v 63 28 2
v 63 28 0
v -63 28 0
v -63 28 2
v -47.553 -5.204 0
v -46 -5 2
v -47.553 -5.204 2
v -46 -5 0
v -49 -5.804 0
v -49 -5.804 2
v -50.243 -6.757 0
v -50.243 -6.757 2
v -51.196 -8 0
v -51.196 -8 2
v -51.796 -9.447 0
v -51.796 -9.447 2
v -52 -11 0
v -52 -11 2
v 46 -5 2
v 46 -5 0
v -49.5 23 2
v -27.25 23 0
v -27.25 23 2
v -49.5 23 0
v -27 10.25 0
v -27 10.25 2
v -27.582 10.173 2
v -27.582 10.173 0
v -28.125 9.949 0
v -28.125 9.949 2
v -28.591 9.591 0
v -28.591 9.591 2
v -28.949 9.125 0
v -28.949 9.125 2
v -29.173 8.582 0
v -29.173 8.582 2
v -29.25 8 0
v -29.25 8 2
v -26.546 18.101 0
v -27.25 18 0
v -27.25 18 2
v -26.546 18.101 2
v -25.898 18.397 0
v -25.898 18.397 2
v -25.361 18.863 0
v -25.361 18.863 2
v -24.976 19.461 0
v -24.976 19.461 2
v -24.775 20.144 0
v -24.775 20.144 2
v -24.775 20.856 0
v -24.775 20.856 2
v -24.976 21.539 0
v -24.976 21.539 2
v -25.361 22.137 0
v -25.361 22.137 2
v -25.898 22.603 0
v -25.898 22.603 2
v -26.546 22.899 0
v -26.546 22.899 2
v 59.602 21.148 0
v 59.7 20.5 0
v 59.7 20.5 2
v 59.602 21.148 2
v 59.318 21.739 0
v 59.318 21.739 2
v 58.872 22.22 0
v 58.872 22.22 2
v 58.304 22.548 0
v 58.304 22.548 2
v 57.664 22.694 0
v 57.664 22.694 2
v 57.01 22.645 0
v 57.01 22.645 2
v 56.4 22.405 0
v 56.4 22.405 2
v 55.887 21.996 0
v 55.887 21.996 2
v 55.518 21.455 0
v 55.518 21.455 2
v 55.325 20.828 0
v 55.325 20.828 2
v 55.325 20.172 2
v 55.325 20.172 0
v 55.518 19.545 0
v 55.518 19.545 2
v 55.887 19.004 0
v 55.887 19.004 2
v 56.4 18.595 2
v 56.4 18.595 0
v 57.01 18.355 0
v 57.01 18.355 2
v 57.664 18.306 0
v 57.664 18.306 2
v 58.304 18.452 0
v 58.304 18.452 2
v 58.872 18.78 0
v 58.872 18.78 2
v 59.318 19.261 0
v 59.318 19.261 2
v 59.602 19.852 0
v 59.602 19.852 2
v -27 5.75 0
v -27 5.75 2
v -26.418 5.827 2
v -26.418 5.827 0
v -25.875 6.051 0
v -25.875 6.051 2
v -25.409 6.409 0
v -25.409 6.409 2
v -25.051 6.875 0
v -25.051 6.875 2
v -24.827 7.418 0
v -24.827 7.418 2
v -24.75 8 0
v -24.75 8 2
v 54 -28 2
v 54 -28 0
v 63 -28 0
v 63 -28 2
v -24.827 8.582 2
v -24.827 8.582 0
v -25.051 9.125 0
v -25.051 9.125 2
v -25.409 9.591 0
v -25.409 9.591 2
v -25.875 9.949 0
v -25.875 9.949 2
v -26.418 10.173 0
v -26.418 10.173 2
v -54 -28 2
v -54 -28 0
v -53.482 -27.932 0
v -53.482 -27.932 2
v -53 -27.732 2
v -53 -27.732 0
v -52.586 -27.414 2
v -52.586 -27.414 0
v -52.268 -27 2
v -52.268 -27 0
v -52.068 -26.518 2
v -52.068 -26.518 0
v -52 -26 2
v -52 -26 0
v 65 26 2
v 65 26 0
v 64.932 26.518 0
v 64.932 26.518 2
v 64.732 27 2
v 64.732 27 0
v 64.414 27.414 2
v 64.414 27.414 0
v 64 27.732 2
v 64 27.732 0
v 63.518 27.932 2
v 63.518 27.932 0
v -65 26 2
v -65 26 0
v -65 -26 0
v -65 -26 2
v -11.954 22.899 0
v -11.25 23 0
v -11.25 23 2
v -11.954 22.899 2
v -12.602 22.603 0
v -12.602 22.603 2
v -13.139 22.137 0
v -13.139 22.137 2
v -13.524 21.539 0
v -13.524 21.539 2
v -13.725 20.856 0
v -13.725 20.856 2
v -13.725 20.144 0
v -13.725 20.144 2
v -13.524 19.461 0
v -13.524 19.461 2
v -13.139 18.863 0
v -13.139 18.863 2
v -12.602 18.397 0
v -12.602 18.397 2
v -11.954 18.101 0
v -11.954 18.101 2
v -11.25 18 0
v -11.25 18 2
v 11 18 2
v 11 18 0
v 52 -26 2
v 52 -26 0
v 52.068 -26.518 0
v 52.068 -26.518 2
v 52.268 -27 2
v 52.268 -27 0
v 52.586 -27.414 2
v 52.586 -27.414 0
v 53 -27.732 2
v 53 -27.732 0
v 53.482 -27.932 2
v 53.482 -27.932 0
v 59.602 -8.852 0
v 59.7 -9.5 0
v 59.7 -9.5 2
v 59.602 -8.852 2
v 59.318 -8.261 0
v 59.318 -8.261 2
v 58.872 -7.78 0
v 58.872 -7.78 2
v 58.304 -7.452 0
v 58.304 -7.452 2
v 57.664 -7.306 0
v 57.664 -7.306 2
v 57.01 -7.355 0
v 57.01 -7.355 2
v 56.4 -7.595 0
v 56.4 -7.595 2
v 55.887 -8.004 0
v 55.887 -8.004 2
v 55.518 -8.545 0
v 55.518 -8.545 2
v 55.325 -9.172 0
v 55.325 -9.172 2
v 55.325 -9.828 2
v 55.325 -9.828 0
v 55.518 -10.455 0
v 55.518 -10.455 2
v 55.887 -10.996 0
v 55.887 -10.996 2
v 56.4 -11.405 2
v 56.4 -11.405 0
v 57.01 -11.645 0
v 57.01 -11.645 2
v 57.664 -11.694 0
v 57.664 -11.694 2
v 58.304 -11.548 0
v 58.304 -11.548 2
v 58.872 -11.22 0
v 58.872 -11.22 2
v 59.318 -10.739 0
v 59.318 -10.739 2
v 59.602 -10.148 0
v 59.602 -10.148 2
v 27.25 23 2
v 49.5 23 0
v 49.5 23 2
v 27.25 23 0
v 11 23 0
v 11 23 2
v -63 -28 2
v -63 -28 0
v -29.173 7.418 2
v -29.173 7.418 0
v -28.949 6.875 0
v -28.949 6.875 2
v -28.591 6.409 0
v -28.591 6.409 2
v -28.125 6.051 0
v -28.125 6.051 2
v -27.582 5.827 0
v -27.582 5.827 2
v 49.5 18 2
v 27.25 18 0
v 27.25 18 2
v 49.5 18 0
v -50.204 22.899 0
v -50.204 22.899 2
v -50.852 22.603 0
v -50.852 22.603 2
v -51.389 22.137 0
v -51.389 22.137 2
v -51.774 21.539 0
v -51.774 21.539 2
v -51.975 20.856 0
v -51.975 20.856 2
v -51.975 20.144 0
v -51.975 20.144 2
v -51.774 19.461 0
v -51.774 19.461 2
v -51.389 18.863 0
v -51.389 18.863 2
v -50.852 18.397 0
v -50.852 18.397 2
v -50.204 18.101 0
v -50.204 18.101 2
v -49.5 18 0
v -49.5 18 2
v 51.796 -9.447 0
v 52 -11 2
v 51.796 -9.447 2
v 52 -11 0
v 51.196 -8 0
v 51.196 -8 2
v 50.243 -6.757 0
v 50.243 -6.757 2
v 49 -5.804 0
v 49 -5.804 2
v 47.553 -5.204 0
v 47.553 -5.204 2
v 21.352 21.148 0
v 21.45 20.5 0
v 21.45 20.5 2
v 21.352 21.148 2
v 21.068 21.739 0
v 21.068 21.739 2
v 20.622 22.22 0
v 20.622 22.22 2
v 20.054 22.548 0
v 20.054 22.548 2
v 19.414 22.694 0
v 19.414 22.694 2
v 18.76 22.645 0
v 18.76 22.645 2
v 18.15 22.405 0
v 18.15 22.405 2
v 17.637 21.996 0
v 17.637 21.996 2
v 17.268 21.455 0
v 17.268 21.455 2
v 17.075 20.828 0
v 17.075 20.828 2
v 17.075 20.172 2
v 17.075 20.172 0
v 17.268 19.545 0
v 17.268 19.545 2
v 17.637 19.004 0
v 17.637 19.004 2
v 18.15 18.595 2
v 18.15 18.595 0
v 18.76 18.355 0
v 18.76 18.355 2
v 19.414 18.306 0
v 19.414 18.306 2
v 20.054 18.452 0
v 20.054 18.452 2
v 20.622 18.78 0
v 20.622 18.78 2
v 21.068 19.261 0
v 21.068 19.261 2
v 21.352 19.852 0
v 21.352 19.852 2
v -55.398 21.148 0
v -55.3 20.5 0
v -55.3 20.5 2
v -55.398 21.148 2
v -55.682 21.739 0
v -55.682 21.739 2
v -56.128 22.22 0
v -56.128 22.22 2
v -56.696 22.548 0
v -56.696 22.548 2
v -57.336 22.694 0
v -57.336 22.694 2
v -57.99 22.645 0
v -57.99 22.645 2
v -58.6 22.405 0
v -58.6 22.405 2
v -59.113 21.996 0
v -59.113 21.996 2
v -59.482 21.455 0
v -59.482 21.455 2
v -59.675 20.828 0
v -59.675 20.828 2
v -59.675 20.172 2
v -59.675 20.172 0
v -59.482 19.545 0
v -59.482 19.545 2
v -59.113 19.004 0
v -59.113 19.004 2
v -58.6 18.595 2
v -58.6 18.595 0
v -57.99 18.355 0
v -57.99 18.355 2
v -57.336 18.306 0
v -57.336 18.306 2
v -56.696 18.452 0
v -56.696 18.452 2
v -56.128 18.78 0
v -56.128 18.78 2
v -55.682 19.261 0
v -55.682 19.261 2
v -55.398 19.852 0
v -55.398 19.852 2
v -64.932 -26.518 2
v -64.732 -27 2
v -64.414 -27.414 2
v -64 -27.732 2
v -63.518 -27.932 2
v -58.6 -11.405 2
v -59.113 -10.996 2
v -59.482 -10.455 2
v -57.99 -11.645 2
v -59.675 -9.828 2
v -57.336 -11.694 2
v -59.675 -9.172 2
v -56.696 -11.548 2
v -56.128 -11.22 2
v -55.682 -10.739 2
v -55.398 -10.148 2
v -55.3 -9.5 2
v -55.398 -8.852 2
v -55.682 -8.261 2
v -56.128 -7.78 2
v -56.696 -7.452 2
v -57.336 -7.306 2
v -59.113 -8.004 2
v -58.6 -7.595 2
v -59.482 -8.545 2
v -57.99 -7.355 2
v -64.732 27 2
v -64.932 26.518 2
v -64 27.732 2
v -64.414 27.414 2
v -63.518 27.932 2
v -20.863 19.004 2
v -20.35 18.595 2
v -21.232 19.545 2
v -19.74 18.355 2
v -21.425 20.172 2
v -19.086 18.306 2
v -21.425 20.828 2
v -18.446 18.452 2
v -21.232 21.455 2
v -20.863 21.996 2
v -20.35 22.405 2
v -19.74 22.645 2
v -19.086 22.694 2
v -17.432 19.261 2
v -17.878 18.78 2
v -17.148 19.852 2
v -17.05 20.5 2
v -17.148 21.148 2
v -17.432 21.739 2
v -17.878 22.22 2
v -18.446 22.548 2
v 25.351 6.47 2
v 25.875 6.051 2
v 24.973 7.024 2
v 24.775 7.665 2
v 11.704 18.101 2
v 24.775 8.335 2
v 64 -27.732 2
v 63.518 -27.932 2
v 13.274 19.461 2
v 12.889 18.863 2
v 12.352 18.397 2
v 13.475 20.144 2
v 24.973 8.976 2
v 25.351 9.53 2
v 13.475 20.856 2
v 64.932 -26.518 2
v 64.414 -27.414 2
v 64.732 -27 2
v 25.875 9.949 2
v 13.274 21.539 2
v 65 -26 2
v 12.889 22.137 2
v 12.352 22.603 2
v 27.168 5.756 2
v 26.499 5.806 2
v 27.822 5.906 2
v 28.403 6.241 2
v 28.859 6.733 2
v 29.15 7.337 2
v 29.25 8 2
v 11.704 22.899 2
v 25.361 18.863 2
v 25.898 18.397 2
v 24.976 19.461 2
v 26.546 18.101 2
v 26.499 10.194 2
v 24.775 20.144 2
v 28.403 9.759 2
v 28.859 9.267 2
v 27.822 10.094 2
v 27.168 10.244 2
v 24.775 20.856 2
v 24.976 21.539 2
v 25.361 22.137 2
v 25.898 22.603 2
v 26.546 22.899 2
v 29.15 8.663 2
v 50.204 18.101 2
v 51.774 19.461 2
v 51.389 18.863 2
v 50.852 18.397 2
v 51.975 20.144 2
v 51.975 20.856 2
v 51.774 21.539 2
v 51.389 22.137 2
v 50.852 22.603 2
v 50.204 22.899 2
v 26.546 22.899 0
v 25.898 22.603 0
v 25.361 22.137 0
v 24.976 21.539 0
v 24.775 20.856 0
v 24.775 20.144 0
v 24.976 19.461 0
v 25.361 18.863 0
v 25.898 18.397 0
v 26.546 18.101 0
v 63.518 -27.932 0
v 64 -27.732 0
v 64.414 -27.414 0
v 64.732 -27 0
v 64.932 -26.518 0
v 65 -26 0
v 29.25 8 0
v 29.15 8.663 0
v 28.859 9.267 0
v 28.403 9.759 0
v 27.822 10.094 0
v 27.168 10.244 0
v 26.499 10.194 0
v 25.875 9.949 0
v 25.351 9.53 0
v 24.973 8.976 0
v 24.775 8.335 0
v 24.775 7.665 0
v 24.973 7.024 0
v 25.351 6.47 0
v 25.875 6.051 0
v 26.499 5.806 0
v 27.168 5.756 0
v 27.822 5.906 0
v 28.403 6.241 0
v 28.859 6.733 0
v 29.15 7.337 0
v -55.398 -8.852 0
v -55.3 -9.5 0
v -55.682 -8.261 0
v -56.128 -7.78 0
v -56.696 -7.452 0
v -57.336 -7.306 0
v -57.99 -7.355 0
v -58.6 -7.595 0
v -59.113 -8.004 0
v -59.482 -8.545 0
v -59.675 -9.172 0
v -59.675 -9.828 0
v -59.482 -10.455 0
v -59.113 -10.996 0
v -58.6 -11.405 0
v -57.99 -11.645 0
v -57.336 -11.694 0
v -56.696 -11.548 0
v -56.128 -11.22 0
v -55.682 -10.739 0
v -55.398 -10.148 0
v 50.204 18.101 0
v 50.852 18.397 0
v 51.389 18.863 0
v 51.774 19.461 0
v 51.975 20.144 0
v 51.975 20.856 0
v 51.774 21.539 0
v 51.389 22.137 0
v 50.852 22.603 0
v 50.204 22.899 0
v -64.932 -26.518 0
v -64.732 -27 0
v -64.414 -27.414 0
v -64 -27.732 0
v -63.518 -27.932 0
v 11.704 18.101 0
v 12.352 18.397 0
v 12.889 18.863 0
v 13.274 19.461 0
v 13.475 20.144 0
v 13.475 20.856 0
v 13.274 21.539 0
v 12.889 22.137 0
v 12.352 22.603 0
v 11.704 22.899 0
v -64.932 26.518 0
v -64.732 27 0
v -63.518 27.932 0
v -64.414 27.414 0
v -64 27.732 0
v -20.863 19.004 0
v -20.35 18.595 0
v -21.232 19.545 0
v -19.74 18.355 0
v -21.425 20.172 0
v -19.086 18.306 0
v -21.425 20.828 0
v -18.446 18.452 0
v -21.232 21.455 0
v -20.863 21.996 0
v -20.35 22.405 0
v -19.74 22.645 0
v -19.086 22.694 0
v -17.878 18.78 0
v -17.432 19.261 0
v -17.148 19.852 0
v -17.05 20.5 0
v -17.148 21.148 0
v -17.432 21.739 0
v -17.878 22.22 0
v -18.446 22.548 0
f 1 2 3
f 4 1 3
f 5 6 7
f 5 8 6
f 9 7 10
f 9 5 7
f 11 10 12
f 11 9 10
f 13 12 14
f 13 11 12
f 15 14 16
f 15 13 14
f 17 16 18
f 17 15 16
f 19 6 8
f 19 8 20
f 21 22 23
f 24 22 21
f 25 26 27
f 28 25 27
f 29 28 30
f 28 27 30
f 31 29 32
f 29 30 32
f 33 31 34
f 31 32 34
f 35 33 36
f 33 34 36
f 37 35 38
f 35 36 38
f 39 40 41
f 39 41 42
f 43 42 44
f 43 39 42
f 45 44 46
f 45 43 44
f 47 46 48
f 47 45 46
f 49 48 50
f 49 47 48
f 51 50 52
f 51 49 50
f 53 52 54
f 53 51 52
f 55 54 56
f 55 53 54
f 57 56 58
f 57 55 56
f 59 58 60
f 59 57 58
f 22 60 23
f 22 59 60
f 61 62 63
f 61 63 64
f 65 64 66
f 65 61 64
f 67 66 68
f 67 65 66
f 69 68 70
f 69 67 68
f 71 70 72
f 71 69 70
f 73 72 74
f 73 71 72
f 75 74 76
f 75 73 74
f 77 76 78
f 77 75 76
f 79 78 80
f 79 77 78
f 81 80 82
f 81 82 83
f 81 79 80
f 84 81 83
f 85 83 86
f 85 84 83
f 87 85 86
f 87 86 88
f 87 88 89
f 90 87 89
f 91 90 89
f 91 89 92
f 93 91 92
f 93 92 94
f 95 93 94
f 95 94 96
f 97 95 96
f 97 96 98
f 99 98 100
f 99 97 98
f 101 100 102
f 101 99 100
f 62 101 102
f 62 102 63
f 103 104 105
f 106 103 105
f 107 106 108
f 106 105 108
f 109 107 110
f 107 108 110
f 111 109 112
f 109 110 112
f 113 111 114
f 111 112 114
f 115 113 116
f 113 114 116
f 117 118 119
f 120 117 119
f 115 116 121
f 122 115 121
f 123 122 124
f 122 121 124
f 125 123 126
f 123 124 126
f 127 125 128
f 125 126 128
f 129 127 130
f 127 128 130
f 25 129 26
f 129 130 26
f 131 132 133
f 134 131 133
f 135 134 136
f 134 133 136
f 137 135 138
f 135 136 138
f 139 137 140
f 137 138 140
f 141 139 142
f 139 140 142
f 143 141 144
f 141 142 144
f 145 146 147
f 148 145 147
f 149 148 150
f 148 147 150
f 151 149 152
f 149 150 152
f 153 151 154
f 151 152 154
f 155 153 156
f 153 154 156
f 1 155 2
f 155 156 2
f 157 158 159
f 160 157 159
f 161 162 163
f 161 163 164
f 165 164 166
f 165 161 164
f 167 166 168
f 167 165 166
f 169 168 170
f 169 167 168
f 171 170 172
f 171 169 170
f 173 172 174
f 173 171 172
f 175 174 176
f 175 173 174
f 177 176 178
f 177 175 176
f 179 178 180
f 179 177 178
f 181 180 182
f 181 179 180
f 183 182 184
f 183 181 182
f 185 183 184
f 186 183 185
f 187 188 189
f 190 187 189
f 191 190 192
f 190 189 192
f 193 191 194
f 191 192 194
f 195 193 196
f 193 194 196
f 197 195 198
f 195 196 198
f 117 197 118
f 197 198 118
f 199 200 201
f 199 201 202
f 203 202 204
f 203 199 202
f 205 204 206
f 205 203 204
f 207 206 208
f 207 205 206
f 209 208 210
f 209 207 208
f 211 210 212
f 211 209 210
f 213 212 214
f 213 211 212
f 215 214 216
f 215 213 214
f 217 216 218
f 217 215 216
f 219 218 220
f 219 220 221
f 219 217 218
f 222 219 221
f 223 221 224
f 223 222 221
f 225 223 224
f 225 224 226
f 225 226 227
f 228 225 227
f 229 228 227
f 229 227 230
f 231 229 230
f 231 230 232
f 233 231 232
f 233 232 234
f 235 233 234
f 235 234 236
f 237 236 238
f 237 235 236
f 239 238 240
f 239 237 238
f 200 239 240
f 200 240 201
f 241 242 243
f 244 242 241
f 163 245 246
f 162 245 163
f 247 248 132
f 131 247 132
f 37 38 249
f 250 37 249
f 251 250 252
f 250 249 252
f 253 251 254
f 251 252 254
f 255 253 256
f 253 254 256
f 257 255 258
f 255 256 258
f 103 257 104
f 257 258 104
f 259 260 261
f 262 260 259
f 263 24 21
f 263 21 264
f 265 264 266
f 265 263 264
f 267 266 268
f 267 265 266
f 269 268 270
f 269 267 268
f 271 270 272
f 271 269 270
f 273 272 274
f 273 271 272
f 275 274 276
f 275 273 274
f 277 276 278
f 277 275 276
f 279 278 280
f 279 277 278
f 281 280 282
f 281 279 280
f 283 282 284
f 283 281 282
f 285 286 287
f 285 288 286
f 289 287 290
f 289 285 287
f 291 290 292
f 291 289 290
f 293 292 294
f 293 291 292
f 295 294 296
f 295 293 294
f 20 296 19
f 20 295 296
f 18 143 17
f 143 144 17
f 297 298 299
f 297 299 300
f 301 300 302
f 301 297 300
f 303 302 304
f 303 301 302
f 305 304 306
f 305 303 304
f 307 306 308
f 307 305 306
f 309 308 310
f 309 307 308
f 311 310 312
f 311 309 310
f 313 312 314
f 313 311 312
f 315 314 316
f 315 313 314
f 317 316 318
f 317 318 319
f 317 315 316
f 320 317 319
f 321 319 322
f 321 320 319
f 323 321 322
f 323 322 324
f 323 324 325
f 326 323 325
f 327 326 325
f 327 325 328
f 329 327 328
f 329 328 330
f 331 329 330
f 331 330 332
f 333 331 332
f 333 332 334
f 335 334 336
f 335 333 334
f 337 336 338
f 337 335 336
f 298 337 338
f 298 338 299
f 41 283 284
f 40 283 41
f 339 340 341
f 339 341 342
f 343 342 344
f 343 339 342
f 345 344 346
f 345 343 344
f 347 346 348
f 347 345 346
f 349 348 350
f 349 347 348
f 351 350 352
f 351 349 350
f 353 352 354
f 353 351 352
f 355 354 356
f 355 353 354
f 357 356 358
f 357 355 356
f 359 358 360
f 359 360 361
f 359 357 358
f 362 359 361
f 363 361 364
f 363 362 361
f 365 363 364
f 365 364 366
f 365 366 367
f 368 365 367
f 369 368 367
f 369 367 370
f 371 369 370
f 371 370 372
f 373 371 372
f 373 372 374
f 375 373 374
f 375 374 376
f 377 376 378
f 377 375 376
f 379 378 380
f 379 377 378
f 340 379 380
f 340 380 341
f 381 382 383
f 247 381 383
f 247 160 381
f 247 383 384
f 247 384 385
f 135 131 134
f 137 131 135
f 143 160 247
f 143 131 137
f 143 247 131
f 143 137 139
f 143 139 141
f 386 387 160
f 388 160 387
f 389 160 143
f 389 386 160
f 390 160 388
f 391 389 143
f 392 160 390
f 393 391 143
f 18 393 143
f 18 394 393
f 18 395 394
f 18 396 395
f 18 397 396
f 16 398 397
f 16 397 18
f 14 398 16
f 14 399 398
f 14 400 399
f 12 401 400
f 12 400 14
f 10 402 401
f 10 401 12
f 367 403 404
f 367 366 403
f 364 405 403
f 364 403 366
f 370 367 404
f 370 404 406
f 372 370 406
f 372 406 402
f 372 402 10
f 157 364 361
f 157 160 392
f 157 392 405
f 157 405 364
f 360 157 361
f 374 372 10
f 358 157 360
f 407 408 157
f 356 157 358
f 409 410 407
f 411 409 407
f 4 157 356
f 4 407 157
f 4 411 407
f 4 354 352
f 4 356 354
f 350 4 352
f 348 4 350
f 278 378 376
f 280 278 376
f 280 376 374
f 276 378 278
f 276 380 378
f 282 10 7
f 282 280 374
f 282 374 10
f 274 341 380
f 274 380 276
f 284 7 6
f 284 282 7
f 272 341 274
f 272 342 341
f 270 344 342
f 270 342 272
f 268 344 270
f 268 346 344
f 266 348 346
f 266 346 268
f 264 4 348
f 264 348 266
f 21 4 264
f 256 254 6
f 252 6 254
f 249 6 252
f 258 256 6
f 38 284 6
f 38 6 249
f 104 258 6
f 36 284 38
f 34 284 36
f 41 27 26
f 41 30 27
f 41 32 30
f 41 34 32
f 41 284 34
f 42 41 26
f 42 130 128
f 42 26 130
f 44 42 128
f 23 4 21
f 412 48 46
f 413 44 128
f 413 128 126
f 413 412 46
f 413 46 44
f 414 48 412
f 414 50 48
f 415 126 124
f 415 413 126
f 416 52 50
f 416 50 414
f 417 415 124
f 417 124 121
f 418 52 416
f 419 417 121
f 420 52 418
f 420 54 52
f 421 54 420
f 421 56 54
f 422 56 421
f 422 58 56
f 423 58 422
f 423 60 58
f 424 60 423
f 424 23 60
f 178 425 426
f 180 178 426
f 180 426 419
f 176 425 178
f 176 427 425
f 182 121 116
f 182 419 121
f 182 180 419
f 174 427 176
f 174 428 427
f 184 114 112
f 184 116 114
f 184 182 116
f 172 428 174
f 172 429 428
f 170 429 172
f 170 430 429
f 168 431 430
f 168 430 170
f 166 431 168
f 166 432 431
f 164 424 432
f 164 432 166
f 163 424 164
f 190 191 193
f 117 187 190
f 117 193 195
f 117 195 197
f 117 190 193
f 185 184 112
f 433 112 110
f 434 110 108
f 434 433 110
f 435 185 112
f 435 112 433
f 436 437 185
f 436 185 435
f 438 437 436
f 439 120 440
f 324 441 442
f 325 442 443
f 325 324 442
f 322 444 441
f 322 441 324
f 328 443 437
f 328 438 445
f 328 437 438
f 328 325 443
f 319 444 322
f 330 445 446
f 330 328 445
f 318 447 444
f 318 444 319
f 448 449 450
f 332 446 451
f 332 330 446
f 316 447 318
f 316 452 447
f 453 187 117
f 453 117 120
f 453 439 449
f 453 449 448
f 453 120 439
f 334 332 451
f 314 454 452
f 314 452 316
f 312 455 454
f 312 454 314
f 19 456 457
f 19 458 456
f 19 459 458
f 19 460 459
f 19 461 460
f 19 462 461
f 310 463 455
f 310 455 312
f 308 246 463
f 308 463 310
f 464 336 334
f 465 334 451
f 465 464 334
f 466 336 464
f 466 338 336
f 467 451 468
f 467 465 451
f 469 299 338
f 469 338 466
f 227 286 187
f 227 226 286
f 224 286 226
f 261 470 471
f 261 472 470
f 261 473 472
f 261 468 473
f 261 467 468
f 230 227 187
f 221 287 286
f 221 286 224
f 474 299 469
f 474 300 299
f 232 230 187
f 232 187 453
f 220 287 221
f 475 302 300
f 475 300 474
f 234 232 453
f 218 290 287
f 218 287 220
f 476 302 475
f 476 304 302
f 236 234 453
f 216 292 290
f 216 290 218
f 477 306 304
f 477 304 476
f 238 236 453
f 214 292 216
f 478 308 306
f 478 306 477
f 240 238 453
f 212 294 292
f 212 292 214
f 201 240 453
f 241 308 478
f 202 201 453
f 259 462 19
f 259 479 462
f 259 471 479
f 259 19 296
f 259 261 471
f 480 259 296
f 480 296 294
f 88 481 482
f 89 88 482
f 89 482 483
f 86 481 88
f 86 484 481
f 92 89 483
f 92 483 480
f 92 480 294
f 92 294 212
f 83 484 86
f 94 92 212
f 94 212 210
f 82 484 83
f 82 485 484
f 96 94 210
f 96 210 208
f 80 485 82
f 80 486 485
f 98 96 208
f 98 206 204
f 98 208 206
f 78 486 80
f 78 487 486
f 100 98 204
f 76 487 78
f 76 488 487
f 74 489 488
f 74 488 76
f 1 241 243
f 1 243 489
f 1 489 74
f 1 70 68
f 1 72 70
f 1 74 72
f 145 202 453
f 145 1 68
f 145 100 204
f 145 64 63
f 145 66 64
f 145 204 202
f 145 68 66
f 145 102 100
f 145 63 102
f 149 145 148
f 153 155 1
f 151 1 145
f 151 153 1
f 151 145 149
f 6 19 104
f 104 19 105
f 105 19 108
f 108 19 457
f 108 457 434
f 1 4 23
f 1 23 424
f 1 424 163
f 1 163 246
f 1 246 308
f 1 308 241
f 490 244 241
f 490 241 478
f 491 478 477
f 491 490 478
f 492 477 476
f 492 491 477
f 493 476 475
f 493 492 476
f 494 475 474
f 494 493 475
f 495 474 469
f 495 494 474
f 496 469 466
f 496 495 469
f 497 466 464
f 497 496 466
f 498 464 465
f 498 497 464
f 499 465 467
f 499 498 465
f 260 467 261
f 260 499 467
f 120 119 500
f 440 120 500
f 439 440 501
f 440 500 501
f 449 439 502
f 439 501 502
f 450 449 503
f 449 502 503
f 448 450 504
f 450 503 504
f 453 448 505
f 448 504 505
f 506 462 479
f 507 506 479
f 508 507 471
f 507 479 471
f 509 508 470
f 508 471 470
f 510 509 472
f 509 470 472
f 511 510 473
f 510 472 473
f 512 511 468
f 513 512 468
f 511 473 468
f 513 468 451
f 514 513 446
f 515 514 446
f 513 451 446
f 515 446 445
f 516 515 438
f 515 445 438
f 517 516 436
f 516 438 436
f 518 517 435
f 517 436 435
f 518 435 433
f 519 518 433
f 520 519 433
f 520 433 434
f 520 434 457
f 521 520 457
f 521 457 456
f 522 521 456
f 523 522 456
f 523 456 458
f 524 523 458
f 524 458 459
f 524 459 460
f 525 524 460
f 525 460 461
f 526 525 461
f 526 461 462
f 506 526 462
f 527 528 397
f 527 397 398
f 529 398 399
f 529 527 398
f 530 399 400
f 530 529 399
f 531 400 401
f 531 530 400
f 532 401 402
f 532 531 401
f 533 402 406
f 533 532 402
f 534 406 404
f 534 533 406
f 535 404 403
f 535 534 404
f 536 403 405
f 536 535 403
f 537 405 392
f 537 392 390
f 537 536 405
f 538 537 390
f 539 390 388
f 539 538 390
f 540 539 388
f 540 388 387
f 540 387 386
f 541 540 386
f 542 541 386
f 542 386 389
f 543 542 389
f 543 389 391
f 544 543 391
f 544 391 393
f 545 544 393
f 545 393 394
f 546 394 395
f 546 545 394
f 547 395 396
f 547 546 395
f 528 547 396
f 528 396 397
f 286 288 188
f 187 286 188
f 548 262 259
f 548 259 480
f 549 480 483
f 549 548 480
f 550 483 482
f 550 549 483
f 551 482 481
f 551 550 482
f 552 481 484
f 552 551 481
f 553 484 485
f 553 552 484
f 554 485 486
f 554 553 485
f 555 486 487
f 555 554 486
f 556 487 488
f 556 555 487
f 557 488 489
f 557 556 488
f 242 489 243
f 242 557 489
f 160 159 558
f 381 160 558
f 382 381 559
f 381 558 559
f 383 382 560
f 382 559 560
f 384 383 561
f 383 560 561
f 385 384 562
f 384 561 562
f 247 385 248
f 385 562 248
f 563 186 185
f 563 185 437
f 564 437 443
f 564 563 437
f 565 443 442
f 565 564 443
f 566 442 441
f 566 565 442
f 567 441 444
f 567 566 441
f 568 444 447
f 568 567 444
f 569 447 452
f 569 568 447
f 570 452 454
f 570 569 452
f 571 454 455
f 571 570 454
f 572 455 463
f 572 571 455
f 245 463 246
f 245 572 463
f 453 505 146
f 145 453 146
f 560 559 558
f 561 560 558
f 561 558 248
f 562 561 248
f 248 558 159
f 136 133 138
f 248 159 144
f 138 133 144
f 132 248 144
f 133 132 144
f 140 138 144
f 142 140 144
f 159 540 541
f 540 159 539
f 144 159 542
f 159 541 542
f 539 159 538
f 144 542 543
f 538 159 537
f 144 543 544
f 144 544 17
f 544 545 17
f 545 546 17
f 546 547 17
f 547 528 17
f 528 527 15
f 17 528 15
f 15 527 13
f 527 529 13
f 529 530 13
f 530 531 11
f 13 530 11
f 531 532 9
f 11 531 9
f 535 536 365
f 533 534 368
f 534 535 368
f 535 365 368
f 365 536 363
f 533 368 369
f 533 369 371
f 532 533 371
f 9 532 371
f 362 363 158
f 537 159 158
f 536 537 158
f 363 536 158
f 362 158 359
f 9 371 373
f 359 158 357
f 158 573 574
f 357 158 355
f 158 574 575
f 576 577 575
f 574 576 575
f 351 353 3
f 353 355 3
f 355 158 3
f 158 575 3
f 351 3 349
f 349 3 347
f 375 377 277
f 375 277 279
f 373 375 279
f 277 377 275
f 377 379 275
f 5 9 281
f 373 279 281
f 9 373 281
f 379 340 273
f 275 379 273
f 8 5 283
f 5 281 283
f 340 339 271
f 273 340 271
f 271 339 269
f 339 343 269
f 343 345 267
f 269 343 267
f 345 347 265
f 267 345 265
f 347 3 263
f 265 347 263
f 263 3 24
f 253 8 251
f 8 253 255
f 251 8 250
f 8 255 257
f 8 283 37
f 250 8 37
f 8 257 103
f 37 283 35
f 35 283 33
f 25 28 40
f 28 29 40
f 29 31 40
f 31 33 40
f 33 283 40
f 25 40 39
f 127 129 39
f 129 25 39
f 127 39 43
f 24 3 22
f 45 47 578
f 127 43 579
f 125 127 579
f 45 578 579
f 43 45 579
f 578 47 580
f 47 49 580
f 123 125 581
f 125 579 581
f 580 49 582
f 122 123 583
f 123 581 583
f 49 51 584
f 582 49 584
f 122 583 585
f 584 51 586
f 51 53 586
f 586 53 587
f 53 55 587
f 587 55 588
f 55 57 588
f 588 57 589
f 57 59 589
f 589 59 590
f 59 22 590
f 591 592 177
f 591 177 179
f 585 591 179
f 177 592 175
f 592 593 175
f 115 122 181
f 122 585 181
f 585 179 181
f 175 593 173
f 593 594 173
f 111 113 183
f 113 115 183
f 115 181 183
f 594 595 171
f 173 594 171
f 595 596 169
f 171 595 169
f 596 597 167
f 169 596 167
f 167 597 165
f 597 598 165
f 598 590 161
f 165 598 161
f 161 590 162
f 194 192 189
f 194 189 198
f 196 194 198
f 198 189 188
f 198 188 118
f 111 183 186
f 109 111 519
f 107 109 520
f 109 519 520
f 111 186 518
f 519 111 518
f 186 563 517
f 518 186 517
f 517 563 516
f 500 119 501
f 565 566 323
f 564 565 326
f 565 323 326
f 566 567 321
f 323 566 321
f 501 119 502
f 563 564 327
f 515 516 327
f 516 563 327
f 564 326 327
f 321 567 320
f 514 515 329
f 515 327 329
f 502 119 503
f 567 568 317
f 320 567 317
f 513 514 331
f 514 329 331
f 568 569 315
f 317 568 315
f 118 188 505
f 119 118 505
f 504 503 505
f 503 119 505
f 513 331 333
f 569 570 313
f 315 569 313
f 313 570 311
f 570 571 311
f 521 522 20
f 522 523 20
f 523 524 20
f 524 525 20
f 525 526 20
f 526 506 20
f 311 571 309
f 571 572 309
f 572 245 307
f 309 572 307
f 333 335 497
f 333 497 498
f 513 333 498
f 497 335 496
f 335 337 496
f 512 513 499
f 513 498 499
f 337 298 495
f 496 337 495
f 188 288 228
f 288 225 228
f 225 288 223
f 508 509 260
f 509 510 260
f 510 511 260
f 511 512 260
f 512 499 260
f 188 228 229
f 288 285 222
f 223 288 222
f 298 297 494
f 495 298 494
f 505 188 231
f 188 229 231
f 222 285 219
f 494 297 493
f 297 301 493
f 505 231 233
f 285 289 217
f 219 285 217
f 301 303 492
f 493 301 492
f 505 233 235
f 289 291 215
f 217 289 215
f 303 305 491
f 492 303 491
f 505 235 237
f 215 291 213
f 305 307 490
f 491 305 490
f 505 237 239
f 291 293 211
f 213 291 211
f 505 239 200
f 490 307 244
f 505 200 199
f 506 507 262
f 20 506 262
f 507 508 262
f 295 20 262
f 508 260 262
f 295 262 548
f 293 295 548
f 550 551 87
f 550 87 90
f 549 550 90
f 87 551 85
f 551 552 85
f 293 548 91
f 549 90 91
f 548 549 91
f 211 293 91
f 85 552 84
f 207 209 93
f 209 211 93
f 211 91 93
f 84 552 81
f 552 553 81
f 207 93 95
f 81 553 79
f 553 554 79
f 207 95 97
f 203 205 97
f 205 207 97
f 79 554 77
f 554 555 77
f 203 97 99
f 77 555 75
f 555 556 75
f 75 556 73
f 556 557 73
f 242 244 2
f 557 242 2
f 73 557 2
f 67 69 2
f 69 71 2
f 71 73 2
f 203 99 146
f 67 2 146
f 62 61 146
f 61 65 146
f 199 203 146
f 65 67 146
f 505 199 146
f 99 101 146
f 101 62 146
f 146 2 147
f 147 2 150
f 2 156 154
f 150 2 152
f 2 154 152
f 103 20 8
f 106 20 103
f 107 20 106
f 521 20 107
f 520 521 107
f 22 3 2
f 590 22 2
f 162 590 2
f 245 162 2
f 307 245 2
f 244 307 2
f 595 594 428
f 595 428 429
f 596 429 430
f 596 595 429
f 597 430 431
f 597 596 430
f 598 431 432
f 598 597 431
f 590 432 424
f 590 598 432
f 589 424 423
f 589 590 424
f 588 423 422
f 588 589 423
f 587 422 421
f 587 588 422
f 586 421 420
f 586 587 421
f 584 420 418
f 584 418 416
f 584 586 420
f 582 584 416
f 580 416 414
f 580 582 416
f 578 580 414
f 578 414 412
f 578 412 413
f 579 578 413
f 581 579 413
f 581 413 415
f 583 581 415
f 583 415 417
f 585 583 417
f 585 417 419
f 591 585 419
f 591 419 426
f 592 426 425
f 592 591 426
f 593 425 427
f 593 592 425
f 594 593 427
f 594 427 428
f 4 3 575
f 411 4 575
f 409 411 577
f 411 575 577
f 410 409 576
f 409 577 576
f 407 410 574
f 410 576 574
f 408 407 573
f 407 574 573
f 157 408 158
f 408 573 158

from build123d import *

# Parameters (mm, degrees)
SKETCH_1_R          = 2.2
SKETCH_1_R_2        = 2.25
EXTRUDE_1_DEPTH     = 2
EXTRUDE_START       = -2
EXTRUDE_2_DEPTH     = 2
SKETCH_3_R          = 2.25
CUT_EXTRUDE_1_DEPTH = 23
SKETCH_3_3_R        = 2.25
EXTRUDE_3_DEPTH     = 2
SKETCH_5_W          = 104
SKETCH_5_H          = 6
CUT_EXTRUDE_2_DEPTH = 24
FILLET_1_R          = 6


with BuildPart() as part:
    # 草图1 → 凸台-拉伸1 (new body)
    with BuildSketch(Plane.XY):
        with BuildLine():
            Line((63, 28), (-63, 28))
            ThreePointArc((-63, 28), (-64.414213562, 27.414213562), (-65, 26))
            Line((-65, 26), (-65, -26))
            ThreePointArc((-65, -26), (-64.414213562, -27.414213562), (-63, -28))
            Line((-63, -28), (-54, -28))
            ThreePointArc((-54, -28), (-52.585786438, -27.414213562), (-52, -26))
            Line((-52, -26), (-52, -8))
            ThreePointArc((-52, -8), (-51.414213562, -6.585786438), (-50, -6))
            Line((-50, -6), (50, -6))
            ThreePointArc((50, -6), (51.414213562, -6.585786438), (52, -8))
            Line((52, -8), (52, -26))
            ThreePointArc((52, -26), (52.585786438, -27.414213562), (54, -28))
            Line((54, -28), (63, -28))
            ThreePointArc((63, -28), (64.414213562, -27.414213562), (65, -26))
            Line((65, -26), (65, 26))
            ThreePointArc((65, 26), (64.414213562, 27.414213562), (63, 28))
        make_face()
        with Locations((-57.5, -9.5)):
            Circle(SKETCH_1_R, mode=Mode.SUBTRACT)
        with Locations((-57.5, 20.5)):
            Circle(SKETCH_1_R, mode=Mode.SUBTRACT)
        with Locations((19.25, 20.5)):
            Circle(SKETCH_1_R, mode=Mode.SUBTRACT)
        with Locations((-19.25, 20.5)):
            Circle(SKETCH_1_R, mode=Mode.SUBTRACT)
        with Locations((57.5, 20.5)):
            Circle(SKETCH_1_R, mode=Mode.SUBTRACT)
        with Locations((57.5, -9.5)):
            Circle(SKETCH_1_R, mode=Mode.SUBTRACT)
        with Locations((27, 2.5)):
            Circle(SKETCH_1_R_2, mode=Mode.SUBTRACT)
        with Locations((-27, 2.5)):
            Circle(SKETCH_1_R_2, mode=Mode.SUBTRACT)
        with BuildLine():
            Line((27.25, 18), (49.5, 18))
            ThreePointArc((49.5, 18), (52, 20.5), (49.5, 23))
            Line((49.5, 23), (27.25, 23))
            ThreePointArc((27.25, 23), (24.75, 20.5), (27.25, 18))
        make_face(mode=Mode.SUBTRACT)
        with BuildLine():
            Line((-11.25, 18), (11, 18))
            ThreePointArc((11, 18), (13.5, 20.5), (11, 23))
            Line((11, 23), (-11.25, 23))
            ThreePointArc((-11.25, 23), (-13.75, 20.5), (-11.25, 18))
        make_face(mode=Mode.SUBTRACT)
        with BuildLine():
            Line((-49.5, 18), (-27.25, 18))
            ThreePointArc((-27.25, 18), (-24.75, 20.5), (-27.25, 23))
            Line((-27.25, 23), (-49.5, 23))
            ThreePointArc((-49.5, 23), (-52, 20.5), (-49.5, 18))
        make_face(mode=Mode.SUBTRACT)
    extrude(amount=EXTRUDE_1_DEPTH)

    # 草图2 → 凸台-拉伸2 (add)
    with BuildSketch(Plane.XY.offset(2).offset(EXTRUDE_START)):
        with BuildLine():
            Line((-52, -8), (-52, -11))
            Line((-52, -11), (52, -11))
            Line((52, -11), (52, -8))
            ThreePointArc((52, -8), (51.414213562, -6.585786438), (50, -6))
            Line((50, -6), (-50, -6))
            ThreePointArc((-50, -6), (-51.414213562, -6.585786438), (-52, -8))
        make_face()
    extrude(amount=EXTRUDE_2_DEPTH)

    # 草图3 → 切除-拉伸1 (cut)
    with BuildSketch(Plane.XY.offset(2)):
        with Locations((-27, 8)):
            Circle(SKETCH_3_R)
        with Locations((27, 8)):
            Circle(SKETCH_3_R)
    extrude(amount=-CUT_EXTRUDE_1_DEPTH, mode=Mode.SUBTRACT)

    # 草图3<3> → 凸台-拉伸3 (add)
    with BuildSketch(Plane.XY.offset(2).offset(EXTRUDE_START)):
        with Locations((27, 2.5)):
            Circle(SKETCH_3_3_R)
        with Locations((-27, 2.5)):
            Circle(SKETCH_3_3_R)
    extrude(amount=EXTRUDE_3_DEPTH)

    # 草图5 → 切除-拉伸2 (cut)
    with BuildSketch(Plane.XY.offset(2)):
        with Locations((0, -8)):
            Rectangle(SKETCH_5_W, SKETCH_5_H)
    extrude(amount=-CUT_EXTRUDE_2_DEPTH, mode=Mode.SUBTRACT)

    # 圆角1
    fillet_1_edges = [part.edges().sort_by_distance(p)[0] for p in [
        (52, -5, 1),
        (-52, -5, 1),
    ]]
    fillet(fillet_1_edges, radius=FILLET_1_R)


solid = part.part
